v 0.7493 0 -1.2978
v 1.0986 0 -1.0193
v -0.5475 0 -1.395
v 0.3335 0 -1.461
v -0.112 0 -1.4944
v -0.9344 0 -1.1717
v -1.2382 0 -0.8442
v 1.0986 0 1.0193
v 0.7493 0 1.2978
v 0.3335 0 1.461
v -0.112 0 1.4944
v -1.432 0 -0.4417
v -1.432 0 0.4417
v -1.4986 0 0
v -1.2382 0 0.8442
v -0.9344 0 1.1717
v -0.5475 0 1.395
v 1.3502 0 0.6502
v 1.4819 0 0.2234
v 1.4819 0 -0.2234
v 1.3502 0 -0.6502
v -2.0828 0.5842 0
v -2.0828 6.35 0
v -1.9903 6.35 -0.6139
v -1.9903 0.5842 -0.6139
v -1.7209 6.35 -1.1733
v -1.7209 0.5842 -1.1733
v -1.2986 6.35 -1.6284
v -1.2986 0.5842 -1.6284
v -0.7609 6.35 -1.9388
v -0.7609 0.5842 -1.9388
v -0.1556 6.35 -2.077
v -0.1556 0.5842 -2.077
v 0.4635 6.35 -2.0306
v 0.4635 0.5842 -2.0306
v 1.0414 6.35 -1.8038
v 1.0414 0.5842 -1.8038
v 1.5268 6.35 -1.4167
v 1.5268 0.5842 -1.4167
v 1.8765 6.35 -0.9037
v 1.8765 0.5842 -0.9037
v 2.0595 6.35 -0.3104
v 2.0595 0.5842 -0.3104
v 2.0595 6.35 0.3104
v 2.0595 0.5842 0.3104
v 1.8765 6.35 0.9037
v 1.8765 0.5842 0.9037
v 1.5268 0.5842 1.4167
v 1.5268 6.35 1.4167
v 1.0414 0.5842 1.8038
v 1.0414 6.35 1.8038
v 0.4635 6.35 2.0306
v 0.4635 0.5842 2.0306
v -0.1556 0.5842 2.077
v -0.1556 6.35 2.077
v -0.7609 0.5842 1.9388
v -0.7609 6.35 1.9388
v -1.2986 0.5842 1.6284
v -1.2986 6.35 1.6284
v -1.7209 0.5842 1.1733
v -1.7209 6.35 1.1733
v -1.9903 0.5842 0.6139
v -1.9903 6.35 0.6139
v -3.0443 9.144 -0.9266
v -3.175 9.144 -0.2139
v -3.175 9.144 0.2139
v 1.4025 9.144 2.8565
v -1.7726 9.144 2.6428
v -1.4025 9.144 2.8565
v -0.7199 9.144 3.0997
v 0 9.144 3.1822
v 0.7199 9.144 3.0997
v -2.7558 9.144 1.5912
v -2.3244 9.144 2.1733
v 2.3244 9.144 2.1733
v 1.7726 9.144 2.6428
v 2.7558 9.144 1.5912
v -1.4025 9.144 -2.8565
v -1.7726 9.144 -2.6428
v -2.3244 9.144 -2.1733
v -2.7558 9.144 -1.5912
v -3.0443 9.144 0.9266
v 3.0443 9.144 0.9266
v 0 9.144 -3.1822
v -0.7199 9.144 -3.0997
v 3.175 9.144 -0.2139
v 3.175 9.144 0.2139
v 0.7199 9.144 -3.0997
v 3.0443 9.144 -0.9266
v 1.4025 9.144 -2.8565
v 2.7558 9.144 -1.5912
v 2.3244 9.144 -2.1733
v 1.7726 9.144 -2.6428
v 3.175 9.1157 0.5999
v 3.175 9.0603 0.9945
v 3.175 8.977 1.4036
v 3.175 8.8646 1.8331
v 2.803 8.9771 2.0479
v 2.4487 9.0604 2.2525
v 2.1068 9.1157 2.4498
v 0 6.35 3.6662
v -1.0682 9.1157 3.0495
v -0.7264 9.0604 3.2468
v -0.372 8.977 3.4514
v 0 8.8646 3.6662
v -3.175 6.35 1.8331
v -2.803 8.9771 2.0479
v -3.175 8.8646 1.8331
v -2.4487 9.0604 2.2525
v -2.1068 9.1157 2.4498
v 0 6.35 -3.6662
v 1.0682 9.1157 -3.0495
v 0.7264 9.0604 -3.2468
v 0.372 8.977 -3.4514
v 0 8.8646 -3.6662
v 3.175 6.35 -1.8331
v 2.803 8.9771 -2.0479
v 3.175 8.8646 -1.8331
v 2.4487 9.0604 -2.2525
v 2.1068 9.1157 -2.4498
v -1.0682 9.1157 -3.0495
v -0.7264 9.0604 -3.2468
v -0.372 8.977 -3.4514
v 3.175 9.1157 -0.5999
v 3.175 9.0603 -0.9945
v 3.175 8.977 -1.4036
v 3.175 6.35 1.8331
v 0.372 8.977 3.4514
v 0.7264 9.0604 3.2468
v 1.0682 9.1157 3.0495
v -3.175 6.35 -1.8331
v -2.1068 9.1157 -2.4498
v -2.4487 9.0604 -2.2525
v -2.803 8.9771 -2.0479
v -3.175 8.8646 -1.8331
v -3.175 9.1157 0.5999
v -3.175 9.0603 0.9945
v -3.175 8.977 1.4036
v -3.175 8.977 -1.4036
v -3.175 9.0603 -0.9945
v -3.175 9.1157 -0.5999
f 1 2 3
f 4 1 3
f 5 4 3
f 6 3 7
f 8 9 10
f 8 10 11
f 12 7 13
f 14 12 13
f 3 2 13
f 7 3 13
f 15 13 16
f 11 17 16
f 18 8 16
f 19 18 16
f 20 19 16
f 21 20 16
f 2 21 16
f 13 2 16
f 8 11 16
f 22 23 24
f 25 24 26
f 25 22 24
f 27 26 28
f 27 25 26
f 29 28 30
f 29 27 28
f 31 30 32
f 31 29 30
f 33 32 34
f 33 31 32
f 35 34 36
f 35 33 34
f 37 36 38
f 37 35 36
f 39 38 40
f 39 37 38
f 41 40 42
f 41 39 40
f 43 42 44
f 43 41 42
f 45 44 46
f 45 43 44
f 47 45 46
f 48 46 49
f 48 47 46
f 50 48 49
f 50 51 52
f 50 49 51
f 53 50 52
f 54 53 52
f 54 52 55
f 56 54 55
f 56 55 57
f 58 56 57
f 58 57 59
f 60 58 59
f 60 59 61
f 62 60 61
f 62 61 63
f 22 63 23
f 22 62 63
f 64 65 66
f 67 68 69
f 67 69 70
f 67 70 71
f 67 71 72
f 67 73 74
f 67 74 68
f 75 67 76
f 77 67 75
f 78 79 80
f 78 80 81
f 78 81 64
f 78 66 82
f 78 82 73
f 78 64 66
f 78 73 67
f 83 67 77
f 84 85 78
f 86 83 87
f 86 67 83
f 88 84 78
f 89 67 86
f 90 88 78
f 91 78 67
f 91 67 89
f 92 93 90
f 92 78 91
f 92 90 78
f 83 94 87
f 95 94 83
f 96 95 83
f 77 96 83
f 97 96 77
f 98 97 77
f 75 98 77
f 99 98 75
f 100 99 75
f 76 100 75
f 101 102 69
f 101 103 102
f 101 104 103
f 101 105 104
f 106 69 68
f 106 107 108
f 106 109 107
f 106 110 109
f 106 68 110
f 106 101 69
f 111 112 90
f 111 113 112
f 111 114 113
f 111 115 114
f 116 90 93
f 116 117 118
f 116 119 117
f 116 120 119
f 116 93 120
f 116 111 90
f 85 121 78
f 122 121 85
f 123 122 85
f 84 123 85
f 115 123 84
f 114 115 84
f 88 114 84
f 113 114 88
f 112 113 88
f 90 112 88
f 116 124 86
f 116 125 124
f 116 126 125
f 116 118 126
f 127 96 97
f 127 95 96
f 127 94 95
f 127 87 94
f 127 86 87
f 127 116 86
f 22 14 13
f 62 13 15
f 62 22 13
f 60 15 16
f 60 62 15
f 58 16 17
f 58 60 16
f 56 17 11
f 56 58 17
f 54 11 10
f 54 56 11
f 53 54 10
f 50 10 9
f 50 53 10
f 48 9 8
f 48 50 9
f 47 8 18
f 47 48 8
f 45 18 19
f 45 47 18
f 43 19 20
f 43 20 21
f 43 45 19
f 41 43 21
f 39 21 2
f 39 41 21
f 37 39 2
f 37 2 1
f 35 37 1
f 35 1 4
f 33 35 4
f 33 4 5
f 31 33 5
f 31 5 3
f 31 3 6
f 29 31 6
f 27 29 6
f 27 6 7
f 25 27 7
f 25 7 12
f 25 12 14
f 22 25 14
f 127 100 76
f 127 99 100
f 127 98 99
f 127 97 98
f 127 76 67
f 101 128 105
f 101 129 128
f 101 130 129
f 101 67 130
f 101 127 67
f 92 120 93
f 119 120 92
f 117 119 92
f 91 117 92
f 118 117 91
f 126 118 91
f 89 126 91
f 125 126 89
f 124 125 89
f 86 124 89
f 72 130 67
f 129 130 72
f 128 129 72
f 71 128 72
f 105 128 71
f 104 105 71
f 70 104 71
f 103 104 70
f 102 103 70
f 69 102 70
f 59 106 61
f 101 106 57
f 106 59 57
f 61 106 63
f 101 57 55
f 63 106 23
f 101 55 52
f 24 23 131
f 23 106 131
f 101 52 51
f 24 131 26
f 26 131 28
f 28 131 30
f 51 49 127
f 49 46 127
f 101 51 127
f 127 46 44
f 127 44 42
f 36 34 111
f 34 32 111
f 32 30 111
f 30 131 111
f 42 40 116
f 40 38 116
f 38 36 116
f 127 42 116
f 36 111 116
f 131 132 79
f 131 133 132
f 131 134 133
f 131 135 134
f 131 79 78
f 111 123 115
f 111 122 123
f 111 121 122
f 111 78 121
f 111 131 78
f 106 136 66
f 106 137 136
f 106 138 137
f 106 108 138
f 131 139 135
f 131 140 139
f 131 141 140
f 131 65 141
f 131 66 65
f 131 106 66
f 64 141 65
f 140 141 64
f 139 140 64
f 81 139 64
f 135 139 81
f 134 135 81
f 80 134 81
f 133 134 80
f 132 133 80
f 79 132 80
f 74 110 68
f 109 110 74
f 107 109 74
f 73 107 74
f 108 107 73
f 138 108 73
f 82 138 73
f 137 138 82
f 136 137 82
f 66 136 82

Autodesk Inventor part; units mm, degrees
ref_plane "YZ Plane" through (0, 0, 0) normal (1, 0, 0) x (0, 1, 0)
ref_plane "XZ Plane" through (0, 0, 0) normal (0, 1, 0) x (-1, 0, 0)
ref_plane "XY Plane" through (0, 0, 0) normal (0, 0, 1) x (1, 0, 0)
sketch "Sketch1" plane through (0, 0, 0) normal (0, 1, 0) x (-1, 0, 0)
  circle A0 centre (0, 0) radius 2.0828
  dimension "d0" = 4.1656
extrude "Body" add sketch "Sketch1" along normal blind 6.35
sketch "Sketch2" plane through (0, 6.35, 0) normal (0, 1, 0) x (1, 0, 0)
  line L0 (-3.175, 1.8331) -> (0, 3.6662)
  line L1 (0, 3.6662) -> (3.175, 1.8331)
  line L2 (3.175, 1.8331) -> (3.175, -1.8331)
  line L3 (3.175, -1.8331) -> (0, -3.6662)
  line L4 (0, -3.6662) -> (-3.175, -1.8331)
  line L5 (-3.175, -1.8331) -> (-3.175, 1.8331)
  point P0 (0, 0)
  point P1 (0, 0)
  dimension "d3" = 6.35
extrude "Head" add sketch "Sketch2" along normal blind 2.794
sketch "Sketch3" plane through (0, 0, 0) normal (1, 0, 0) x (0, 1, 0)
  line L0 (8.8646, -3.6662) -> (9.144, -3.1822)
  line L1 (9.144, -3.1822) -> (9.144, -3.6662)
  line L2 (9.144, -3.6662) -> (8.8646, -3.6662)
  line L3 (6.35, -3.6662) -> (9.144, -3.6662) projected
  line L4 (9.144, -1.8331) -> (9.144, -3.6662) projected
  line L5 (-1.8288, 0) -> (10.9728, 0) projected
  point P0 (0, 0)
  dimension "d6" = 0.5588
  dimension "d7" = 60
revolve "Head Chamfer" cut sketch "Sketch3" angle 360 about axis through (0, -10, 0) along (0, 1, 0)
sketch "Sketch4" plane through (0, 0, 0) normal (0, 0, 1) x (1, 0, 0)
  line L0 (-2.0828, 0) -> (-2.0828, 6.35) projected
  line L1 (-2.0828, 0.0762) -> (-2.0828, -0.6413)
  line L2 (-2.0828, -0.6413) -> (-2.6162, -0.3334)
  line L3 (-2.6162, -0.3334) -> (-2.6162, -0.2318)
  line L4 (-2.6162, -0.2318) -> (-2.0828, 0.0762)
  line L5 (2.0828, 0) -> (-2.0828, 0) projected
  point P0 (0, 0)
  dimension "d9" = 60
  dimension "d10" = 0.1016
  dimension "d11" = 0.0762
  dimension "d12" = 0.5334
feature "Thread" [suppressed]
sketch "Sketch5" plane through (0, 0, 0) normal (0, 0, 1) x (1, 0, 0)
  line L0 (0, 0) -> (-1.4986, 0)
  line L1 (-1.4986, 0) -> (-2.2461, 0.7475)
  line L2 (-2.2461, 0.7475) -> (-2.2461, -1.8711)
  line L3 (-2.2461, -1.8711) -> (-1.4986, -1.8711)
  line L4 (-1.4986, -1.8711) -> (-1.4986, 0)
  line L5 (-2.0828, 0) -> (-2.0828, 0) projected
  line L6 (0, -2.3949) -> (0, 1.2713) projected
  point P0 (0, 0)
  dimension "d21" = 1.4986
  dimension "d22" = 135
  dimension "d23" = 0
  dimension "d24" = 0
revolve "Tapered End" cut sketch "Sketch5" angle 360 about axis through (0, -10, 0) along (0, 1, 0)
properties part number "Screw Nylon Hex" material "Black"
